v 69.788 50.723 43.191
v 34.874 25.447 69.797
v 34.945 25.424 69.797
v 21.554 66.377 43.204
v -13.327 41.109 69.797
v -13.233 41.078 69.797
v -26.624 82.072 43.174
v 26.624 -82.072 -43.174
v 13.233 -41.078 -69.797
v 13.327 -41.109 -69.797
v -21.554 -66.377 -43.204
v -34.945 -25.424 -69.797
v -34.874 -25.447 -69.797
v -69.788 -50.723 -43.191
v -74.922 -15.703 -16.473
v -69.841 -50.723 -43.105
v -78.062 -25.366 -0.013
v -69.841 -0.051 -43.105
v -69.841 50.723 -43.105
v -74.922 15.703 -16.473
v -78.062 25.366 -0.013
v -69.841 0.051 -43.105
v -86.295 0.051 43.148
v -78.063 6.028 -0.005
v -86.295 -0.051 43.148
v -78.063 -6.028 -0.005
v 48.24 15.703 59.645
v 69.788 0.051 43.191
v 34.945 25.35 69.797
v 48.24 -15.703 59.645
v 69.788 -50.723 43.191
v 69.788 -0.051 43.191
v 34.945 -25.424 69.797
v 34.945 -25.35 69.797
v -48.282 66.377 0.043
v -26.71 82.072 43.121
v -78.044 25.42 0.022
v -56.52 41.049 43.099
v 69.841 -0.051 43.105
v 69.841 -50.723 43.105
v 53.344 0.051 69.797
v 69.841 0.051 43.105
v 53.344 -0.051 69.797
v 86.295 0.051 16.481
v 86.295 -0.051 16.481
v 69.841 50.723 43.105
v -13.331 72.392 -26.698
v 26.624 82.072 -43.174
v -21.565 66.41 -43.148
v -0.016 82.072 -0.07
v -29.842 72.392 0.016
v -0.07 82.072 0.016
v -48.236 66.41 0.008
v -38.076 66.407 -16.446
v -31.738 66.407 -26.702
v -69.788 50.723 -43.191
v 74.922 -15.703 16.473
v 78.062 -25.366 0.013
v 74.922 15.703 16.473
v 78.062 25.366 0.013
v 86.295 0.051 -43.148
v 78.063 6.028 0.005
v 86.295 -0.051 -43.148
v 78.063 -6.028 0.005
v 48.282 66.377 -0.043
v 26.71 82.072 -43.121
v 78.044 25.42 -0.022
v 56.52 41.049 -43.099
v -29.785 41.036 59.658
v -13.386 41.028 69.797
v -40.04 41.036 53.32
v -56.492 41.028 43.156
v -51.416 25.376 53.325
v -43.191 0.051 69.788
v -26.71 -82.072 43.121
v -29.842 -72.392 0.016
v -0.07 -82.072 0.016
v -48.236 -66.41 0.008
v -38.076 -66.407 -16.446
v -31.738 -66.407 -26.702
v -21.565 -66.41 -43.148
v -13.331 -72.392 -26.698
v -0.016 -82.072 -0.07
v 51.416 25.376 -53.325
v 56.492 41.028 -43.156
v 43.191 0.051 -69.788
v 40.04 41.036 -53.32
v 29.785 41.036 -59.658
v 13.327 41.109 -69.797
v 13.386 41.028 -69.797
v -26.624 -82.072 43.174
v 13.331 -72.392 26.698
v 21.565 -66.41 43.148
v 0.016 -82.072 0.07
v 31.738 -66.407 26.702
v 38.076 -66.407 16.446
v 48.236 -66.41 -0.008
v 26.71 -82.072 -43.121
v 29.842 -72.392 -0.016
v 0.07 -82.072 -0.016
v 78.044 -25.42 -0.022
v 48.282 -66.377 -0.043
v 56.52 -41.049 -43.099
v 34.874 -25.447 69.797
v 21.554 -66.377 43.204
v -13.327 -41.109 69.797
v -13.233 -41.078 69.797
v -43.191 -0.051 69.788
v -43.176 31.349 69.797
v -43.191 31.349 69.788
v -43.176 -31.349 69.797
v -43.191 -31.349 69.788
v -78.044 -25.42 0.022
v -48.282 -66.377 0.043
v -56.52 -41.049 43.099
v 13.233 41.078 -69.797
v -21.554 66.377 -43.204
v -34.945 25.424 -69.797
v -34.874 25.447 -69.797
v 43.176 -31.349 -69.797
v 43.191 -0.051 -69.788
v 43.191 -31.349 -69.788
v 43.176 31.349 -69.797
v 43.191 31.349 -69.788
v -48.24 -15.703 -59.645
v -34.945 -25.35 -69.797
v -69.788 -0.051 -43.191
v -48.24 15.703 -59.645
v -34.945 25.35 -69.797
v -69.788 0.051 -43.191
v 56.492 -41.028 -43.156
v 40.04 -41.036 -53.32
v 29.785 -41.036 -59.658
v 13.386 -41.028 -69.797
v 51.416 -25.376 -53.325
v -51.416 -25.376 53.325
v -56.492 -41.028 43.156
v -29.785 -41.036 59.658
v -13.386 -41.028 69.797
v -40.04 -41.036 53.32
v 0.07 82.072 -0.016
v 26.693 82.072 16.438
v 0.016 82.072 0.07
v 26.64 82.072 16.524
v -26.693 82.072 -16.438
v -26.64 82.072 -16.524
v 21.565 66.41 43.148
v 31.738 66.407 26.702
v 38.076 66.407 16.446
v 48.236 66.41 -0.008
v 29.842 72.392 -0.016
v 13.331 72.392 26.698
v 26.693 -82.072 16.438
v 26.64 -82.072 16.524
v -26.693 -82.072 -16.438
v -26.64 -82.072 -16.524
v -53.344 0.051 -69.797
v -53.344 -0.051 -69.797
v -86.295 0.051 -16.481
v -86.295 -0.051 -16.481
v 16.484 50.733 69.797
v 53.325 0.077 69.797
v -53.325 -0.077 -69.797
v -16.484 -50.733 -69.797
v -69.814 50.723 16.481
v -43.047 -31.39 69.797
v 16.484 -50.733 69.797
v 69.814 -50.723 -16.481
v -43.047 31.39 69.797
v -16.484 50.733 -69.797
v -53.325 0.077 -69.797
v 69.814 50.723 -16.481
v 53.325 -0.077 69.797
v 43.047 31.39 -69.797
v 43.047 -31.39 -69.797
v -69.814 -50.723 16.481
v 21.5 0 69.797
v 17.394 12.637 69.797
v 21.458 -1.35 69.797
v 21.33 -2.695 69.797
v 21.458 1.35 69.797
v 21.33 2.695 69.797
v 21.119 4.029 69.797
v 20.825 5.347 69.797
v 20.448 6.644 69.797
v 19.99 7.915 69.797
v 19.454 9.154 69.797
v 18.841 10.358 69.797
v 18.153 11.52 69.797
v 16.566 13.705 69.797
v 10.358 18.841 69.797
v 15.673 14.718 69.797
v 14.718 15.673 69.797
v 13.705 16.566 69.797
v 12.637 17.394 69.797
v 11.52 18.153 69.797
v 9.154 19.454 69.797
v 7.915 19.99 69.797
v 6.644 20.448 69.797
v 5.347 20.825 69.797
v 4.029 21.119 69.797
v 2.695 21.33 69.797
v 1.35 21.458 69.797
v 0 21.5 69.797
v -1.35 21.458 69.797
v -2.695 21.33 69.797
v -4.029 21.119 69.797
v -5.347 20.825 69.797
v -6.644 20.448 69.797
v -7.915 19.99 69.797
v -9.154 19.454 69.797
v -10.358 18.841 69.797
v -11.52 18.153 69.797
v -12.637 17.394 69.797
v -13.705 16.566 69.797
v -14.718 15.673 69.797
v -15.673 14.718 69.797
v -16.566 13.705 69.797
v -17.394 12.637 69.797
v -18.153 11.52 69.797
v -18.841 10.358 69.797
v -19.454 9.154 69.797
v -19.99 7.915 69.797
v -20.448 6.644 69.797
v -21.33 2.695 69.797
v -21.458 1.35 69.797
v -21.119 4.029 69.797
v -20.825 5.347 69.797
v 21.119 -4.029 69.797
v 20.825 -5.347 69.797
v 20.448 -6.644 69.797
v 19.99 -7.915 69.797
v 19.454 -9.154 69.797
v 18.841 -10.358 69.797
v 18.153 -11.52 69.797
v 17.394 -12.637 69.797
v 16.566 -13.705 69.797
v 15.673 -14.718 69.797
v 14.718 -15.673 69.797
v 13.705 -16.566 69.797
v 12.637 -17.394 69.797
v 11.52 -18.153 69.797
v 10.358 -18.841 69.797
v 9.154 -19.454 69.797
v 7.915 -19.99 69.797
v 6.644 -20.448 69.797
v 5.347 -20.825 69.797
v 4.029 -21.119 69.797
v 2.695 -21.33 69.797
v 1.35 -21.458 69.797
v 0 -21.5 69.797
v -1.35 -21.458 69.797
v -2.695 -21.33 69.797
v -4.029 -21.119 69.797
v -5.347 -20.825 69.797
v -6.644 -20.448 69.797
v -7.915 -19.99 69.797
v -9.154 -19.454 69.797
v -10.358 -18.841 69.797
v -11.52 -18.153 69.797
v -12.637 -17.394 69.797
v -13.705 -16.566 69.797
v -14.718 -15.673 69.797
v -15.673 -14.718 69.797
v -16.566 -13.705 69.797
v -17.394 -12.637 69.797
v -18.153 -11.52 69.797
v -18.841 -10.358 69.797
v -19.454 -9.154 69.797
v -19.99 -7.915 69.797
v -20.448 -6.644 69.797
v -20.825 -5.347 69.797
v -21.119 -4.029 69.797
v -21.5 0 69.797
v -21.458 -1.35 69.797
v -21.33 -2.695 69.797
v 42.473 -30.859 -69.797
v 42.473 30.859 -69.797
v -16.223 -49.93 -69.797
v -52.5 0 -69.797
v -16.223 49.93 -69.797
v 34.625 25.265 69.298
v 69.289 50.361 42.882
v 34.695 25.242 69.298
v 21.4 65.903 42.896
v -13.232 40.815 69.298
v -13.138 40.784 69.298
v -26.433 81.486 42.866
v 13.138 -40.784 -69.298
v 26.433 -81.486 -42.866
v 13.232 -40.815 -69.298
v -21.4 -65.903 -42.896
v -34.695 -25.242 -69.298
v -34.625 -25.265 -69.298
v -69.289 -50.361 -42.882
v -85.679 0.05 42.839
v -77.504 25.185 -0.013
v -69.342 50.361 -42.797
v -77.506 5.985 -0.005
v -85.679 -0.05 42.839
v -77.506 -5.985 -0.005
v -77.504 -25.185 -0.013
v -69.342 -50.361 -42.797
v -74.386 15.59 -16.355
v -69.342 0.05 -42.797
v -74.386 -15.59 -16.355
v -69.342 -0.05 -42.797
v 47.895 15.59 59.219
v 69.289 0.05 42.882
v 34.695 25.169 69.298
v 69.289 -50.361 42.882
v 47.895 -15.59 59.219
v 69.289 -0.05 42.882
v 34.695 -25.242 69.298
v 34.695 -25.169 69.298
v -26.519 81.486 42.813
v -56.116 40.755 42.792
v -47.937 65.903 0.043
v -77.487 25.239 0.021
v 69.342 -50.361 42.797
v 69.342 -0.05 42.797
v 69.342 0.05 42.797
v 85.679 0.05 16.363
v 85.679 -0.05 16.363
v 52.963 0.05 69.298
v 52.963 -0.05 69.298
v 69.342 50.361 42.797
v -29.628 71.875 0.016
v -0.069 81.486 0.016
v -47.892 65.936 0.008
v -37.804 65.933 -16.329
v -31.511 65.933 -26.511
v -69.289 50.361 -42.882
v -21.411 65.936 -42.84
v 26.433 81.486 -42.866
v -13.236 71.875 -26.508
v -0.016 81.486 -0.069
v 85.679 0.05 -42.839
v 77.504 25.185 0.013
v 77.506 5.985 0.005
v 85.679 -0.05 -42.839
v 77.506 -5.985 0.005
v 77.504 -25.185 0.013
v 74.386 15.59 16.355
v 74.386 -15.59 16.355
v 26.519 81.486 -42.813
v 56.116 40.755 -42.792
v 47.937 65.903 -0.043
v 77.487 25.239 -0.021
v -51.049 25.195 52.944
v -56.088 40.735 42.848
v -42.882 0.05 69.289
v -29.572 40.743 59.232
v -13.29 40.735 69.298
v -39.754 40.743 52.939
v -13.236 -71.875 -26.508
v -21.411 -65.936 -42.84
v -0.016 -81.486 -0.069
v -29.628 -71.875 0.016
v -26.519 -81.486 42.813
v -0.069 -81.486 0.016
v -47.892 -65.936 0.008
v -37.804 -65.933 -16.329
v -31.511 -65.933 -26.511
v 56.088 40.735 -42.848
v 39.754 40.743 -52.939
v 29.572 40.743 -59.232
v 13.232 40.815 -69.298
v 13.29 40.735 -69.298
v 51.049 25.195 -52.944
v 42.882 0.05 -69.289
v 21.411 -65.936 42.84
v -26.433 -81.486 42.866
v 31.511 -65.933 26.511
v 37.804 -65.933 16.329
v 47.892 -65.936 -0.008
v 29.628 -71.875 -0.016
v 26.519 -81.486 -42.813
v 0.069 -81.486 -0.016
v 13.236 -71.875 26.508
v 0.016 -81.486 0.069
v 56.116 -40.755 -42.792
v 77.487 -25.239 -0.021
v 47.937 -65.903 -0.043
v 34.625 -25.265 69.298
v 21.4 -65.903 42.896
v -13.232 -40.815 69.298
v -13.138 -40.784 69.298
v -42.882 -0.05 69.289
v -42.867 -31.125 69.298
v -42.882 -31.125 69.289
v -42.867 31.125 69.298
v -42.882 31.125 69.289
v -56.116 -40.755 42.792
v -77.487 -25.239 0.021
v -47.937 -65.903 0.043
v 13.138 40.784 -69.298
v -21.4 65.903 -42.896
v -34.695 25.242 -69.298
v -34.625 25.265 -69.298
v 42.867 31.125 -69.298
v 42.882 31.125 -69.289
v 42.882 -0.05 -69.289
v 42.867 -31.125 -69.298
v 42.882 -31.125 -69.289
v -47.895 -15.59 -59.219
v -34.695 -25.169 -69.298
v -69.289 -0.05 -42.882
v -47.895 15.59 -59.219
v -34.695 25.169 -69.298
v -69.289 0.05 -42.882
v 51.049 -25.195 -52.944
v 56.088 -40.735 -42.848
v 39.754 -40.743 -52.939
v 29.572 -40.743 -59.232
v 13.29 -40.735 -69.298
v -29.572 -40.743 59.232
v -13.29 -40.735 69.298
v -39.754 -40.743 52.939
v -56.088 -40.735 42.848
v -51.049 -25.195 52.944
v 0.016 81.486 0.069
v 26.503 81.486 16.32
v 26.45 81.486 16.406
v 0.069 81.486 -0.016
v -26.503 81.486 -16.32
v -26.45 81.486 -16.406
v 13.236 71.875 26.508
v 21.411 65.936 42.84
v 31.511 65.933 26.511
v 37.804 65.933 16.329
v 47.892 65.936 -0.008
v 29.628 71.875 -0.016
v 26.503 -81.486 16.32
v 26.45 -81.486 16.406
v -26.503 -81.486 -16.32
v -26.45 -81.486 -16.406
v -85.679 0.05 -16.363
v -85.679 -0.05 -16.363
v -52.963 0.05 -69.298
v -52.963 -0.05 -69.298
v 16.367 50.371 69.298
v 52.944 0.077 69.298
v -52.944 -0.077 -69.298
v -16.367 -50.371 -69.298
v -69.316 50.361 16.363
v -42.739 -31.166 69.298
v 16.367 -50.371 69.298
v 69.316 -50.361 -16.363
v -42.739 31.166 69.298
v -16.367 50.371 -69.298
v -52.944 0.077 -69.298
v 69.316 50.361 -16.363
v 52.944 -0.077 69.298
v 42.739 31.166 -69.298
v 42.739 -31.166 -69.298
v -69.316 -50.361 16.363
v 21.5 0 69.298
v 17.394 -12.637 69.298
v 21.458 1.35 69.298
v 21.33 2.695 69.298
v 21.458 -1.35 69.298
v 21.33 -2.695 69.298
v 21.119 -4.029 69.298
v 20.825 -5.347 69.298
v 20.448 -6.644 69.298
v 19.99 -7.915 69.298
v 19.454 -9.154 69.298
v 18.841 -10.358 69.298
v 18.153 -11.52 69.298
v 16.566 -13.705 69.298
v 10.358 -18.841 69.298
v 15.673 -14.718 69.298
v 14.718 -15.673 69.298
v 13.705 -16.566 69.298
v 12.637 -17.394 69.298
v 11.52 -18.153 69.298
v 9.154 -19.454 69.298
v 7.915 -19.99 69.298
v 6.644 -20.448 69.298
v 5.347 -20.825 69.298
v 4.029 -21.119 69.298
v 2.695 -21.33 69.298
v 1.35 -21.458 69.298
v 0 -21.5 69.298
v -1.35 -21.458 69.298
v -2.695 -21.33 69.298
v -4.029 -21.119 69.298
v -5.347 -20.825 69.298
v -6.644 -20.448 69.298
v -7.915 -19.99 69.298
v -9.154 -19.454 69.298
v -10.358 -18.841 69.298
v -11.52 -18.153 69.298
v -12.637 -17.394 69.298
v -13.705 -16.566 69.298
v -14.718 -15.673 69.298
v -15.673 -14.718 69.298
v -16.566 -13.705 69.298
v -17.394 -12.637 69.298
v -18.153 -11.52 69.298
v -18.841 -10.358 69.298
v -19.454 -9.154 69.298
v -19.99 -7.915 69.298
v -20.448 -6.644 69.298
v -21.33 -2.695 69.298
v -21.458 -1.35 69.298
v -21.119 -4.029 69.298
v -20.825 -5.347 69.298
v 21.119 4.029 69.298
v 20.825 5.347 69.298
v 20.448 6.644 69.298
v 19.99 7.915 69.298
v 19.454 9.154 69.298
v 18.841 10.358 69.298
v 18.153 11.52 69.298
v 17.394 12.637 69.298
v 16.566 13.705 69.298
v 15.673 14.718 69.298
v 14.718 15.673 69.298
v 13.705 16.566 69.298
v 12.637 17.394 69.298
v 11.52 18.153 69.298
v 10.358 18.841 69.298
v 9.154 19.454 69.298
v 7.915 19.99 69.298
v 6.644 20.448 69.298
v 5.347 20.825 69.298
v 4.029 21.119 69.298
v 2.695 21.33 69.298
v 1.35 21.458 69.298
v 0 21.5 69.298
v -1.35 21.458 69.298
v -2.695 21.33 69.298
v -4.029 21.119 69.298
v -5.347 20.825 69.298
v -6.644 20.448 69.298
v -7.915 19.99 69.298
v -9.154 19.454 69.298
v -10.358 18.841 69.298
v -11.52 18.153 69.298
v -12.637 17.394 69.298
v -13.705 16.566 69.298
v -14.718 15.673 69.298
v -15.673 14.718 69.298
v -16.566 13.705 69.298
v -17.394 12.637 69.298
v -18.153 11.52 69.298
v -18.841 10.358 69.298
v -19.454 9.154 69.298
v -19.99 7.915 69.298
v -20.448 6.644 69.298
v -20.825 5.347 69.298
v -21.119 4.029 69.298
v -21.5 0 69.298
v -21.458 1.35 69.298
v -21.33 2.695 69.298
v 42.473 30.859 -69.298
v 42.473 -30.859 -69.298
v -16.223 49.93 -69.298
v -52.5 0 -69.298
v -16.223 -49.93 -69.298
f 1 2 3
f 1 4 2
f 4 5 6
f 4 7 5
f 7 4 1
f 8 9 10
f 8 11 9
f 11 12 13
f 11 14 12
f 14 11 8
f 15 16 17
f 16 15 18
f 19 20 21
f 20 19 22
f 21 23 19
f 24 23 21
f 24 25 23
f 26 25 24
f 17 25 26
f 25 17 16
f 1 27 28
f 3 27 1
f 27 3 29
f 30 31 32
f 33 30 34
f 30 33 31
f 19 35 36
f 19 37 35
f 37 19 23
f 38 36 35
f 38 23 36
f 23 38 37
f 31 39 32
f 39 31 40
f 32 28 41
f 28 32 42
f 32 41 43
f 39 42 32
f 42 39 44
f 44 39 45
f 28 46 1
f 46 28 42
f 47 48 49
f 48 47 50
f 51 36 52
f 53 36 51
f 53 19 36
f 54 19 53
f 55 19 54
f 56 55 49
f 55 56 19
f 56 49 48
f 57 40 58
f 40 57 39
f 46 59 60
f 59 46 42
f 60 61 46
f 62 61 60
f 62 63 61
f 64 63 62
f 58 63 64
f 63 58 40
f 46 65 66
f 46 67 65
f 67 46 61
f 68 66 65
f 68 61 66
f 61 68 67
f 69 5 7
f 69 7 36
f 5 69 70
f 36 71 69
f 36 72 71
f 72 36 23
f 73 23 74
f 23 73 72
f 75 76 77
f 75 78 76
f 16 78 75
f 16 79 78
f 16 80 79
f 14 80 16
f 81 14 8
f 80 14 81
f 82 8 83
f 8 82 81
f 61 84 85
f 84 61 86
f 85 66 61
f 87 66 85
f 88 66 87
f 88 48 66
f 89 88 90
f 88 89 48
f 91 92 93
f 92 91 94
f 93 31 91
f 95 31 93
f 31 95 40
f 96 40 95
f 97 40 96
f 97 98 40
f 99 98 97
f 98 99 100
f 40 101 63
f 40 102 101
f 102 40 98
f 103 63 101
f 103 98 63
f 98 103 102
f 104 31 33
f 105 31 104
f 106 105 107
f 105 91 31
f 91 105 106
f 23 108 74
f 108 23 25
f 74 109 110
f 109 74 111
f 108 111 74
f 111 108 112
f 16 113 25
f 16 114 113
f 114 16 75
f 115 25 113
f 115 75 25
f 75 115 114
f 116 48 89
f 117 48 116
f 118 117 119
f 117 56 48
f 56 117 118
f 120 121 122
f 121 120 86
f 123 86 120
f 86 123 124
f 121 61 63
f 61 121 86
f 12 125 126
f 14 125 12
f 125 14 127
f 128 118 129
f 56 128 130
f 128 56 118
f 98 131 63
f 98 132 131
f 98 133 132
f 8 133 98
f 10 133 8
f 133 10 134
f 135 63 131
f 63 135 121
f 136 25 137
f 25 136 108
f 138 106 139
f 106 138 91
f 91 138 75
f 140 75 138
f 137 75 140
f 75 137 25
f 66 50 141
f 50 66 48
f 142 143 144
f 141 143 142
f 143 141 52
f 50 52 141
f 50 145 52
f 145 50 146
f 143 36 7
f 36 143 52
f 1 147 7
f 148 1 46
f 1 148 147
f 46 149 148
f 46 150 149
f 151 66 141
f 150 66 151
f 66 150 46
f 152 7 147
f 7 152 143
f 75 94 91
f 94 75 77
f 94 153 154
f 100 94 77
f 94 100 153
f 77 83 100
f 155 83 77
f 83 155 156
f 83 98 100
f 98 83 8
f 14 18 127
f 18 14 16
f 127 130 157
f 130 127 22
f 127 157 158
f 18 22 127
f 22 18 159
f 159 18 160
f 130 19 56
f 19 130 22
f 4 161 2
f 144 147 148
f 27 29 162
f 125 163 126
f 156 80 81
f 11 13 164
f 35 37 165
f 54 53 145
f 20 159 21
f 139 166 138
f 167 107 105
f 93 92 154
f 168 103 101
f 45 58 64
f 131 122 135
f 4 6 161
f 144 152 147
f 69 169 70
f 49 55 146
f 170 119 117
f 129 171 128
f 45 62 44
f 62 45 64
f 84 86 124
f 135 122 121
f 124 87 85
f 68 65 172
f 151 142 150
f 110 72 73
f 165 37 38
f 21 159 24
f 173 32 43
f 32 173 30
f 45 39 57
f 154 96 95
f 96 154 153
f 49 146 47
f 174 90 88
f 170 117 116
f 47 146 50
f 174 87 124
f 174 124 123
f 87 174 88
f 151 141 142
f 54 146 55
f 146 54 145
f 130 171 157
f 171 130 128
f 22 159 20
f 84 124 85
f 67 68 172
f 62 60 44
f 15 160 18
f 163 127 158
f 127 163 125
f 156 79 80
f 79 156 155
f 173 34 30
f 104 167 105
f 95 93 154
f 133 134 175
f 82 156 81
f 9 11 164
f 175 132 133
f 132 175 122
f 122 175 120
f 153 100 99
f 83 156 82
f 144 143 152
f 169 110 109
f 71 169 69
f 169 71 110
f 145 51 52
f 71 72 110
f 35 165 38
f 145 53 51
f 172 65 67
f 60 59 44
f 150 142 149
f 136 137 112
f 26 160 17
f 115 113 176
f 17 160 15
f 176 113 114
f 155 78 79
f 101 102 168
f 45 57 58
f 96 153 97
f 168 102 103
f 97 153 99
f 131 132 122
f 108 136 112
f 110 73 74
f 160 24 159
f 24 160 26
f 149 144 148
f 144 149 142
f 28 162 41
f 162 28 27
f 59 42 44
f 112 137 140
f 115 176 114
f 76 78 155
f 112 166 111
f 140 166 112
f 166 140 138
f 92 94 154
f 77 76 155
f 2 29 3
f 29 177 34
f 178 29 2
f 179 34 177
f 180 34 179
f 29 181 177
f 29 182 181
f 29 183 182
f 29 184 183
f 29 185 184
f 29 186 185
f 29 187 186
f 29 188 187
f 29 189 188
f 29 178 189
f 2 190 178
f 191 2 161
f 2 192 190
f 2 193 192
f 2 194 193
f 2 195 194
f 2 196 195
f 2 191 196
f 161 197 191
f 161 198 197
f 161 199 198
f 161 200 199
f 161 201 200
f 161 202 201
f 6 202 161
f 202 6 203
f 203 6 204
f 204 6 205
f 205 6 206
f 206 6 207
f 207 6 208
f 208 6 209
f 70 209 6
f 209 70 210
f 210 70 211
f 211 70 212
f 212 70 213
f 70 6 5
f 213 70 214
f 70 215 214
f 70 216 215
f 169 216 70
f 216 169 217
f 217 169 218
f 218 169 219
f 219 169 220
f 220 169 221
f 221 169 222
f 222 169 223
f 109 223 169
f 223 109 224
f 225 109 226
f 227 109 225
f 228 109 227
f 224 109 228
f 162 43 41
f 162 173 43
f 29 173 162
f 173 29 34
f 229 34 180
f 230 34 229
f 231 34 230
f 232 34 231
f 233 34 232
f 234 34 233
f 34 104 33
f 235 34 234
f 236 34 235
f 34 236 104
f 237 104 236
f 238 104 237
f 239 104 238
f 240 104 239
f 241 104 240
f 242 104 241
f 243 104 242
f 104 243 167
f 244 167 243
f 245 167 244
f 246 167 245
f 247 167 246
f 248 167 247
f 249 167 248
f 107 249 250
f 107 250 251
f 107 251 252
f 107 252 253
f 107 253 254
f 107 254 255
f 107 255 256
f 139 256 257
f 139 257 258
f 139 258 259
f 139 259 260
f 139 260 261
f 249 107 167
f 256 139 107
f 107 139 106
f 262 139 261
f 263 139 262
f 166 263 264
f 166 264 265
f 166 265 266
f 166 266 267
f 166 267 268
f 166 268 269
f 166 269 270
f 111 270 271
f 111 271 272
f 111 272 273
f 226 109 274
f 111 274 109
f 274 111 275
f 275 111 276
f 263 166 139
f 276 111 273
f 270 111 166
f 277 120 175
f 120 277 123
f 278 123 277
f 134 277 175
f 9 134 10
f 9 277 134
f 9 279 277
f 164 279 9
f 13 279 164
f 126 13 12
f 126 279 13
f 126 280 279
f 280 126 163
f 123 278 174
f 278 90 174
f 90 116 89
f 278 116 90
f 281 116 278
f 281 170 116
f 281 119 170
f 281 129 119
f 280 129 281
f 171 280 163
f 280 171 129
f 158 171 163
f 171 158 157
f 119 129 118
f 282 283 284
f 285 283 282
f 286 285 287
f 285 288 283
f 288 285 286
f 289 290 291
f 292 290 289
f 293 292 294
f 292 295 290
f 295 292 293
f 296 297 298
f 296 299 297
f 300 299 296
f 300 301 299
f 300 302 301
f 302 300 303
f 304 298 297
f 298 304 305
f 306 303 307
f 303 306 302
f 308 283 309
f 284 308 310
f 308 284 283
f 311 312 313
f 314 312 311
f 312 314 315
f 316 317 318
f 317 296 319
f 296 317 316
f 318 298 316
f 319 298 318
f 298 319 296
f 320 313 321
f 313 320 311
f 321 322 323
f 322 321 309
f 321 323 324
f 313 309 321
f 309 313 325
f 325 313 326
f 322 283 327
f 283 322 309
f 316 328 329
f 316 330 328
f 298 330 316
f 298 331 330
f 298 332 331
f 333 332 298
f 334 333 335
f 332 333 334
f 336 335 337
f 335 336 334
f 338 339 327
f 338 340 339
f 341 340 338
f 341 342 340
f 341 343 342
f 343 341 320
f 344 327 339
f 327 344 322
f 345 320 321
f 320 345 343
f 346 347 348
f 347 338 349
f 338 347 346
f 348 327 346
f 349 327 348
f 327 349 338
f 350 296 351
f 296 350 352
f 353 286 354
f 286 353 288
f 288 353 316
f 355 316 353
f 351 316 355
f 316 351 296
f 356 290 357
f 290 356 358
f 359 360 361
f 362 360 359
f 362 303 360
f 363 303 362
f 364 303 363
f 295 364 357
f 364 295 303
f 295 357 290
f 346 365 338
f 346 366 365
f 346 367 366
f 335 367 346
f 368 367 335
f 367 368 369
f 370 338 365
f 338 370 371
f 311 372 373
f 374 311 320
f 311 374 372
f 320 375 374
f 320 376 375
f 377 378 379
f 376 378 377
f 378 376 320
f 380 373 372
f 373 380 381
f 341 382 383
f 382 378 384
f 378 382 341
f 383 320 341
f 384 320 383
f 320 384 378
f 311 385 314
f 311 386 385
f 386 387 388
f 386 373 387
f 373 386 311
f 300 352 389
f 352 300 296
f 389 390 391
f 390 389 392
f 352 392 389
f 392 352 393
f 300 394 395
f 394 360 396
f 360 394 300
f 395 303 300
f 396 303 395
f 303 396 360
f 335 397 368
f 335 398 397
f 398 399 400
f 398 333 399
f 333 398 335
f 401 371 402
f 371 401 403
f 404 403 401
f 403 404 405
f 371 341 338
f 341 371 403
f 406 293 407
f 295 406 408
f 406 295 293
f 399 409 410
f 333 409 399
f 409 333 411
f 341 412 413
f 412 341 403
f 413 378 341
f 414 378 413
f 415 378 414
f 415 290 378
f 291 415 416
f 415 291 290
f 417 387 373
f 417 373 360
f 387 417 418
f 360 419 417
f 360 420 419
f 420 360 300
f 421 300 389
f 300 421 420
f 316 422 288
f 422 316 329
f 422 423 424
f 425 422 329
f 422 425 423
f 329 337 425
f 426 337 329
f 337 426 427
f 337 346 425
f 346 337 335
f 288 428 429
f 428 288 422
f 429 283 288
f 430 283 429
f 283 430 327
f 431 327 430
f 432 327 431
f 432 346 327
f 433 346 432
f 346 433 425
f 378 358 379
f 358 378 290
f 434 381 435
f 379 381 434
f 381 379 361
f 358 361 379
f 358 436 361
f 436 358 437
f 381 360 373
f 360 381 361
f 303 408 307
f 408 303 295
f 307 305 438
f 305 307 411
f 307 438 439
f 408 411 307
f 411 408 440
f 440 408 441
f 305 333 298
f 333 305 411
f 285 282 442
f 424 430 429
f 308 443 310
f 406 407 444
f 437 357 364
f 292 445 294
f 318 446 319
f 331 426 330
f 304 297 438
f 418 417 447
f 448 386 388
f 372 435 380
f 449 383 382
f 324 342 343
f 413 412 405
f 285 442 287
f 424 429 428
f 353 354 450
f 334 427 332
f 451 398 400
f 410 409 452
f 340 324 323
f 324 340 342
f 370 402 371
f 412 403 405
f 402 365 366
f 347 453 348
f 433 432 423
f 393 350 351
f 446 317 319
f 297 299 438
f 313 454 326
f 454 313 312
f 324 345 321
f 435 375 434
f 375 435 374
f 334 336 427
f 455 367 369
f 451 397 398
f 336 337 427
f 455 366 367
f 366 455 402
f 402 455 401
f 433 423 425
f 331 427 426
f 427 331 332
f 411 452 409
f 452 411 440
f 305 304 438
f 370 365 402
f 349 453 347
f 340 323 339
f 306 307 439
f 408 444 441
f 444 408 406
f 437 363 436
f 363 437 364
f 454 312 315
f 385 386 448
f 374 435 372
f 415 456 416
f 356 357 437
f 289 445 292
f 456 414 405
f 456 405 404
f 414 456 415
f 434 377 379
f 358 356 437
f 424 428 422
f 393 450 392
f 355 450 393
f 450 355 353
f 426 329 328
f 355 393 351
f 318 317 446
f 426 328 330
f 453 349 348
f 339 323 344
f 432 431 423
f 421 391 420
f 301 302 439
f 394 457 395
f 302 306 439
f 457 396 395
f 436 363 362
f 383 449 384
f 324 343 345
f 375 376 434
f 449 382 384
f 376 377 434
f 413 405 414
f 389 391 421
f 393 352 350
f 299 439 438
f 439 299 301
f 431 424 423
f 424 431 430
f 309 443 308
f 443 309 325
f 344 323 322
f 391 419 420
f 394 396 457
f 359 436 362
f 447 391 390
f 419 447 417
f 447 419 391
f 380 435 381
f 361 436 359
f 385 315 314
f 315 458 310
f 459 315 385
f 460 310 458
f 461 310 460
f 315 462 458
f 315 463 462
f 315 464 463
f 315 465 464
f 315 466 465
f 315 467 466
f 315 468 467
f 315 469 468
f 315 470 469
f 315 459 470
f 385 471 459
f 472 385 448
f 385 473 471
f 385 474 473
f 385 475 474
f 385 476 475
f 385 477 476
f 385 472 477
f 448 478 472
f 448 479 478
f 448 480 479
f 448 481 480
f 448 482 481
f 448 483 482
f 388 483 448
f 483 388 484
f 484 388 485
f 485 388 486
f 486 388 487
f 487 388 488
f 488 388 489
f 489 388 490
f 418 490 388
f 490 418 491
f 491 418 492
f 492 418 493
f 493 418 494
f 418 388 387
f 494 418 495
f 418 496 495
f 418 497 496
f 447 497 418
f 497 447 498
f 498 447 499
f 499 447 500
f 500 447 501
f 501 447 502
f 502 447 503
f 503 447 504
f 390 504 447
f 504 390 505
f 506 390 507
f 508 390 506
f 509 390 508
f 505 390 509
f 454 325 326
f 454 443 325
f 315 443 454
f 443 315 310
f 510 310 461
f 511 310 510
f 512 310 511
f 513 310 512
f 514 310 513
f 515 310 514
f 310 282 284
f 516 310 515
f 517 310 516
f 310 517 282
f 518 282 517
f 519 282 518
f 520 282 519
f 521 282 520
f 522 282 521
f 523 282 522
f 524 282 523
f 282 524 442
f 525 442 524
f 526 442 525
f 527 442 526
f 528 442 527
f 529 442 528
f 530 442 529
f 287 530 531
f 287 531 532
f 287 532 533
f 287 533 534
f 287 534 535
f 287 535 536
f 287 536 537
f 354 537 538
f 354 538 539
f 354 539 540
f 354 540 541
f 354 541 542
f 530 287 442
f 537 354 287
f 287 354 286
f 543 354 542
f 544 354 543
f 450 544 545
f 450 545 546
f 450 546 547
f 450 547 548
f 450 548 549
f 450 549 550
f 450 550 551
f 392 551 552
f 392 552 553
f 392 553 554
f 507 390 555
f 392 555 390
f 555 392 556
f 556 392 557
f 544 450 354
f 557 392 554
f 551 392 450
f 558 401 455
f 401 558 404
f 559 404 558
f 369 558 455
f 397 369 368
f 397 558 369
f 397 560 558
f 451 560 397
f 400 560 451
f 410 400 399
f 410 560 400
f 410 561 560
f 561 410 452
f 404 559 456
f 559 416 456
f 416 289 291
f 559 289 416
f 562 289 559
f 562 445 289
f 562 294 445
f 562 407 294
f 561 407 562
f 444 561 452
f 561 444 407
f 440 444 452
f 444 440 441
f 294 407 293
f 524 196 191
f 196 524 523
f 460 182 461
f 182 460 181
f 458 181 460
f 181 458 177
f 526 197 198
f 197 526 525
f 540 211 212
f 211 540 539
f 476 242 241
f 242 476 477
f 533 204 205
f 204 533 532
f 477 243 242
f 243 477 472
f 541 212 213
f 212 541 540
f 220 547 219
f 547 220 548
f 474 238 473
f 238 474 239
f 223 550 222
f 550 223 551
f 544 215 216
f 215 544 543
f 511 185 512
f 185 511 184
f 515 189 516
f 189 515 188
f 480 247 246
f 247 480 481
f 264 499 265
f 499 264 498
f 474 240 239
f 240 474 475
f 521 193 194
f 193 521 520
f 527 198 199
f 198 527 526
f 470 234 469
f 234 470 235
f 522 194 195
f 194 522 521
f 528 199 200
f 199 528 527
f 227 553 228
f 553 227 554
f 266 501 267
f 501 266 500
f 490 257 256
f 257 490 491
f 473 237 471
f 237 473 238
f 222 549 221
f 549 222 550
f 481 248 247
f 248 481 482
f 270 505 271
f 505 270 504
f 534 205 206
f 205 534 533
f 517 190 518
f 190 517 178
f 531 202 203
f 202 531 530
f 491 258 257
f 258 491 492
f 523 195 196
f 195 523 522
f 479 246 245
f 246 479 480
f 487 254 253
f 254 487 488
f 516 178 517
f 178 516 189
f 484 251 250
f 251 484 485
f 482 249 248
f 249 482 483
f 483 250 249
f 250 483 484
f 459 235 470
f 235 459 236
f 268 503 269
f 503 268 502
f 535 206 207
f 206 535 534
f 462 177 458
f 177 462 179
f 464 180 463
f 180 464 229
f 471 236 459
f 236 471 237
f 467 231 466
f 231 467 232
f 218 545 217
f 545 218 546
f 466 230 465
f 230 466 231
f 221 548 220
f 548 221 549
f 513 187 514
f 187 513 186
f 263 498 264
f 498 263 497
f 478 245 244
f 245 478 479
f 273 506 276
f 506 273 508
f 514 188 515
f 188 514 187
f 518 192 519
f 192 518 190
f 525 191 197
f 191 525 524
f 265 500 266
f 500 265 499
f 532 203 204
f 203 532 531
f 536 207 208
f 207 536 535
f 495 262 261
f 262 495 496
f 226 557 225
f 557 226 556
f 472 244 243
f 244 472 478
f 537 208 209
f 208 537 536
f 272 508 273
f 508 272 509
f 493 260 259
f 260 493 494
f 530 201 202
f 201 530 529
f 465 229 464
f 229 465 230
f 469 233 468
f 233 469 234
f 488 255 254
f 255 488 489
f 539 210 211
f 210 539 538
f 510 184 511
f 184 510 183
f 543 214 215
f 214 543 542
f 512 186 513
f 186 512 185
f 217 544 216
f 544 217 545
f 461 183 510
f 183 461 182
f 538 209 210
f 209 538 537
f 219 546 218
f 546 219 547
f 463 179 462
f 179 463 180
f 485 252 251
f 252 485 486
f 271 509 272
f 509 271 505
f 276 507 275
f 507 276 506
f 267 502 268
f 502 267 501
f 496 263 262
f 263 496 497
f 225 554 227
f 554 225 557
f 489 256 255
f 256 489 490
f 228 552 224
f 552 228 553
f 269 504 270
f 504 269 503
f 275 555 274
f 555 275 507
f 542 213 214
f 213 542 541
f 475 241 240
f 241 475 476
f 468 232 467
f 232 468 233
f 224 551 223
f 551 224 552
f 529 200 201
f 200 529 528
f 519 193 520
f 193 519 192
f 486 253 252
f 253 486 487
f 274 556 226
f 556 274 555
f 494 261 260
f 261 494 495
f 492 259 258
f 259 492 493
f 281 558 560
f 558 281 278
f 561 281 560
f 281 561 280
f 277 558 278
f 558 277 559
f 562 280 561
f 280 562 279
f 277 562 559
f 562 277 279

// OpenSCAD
// Draws a polyhedron by its cartesian coordinates (simplified;
// all elements are assumed ±x).
module polyh(points) {
    // OpenSCAD can't draw zero widths, so, we have to make zeros an epsilon larger
    e = 0.001;
    function nonzerofy(xs) = [for (x = xs) x == 0 ? e : x];

    // Draw cubes and then take a convex hull of them
    hull() {
        for(p = points) {
            cube(nonzerofy(p), center=true);
        }
    }
}

phi = (1 + sqrt(5))/2;

module iko() {
    polyh([
        [0,1,phi],
        [1,phi,0],
        [phi,0,1]
    ]);
}

module dode() {
    polyh([
        [1, 1, 1],
        [0, phi, 1/phi],
        [1/phi, 0, phi],
        [phi, 1/phi, 0]
    ]);
}

// https://en.wikipedia.org/wiki/Compound_of_dodecahedron_and_icosahedron
// With top and bottom parts removed
module topless_compound(height) {
    // h is the distance between top and bottom faces of a dodecahedron
    h = 0.5*sqrt(2*phi*phi+1/(phi*phi)+2);

    scale(height/h) intersection() {
        
        // The compound is rotated dodecahedron face down
        rotate([0,atan(phi),0]) {
            iko();
            dode();
        }

        // Cut top and lower parts away.
        cube([10,10, h-0.004], center=true);
    }
}

socket_d = 43;
shade_h = 140;

// Set the final scale and make a hole for the lamp stuff
difference() {
    topless_compound(shade_h);
    cylinder(shade_h, d=socket_d, $fn=100);

    // Just for the looks, won't affect vase printing
    topless_compound(shade_h-1);
    mirror([0,0,1]) rotate([0,0,36])cylinder(shade_h, d=0.75*shade_h, $fn=5);
} 
